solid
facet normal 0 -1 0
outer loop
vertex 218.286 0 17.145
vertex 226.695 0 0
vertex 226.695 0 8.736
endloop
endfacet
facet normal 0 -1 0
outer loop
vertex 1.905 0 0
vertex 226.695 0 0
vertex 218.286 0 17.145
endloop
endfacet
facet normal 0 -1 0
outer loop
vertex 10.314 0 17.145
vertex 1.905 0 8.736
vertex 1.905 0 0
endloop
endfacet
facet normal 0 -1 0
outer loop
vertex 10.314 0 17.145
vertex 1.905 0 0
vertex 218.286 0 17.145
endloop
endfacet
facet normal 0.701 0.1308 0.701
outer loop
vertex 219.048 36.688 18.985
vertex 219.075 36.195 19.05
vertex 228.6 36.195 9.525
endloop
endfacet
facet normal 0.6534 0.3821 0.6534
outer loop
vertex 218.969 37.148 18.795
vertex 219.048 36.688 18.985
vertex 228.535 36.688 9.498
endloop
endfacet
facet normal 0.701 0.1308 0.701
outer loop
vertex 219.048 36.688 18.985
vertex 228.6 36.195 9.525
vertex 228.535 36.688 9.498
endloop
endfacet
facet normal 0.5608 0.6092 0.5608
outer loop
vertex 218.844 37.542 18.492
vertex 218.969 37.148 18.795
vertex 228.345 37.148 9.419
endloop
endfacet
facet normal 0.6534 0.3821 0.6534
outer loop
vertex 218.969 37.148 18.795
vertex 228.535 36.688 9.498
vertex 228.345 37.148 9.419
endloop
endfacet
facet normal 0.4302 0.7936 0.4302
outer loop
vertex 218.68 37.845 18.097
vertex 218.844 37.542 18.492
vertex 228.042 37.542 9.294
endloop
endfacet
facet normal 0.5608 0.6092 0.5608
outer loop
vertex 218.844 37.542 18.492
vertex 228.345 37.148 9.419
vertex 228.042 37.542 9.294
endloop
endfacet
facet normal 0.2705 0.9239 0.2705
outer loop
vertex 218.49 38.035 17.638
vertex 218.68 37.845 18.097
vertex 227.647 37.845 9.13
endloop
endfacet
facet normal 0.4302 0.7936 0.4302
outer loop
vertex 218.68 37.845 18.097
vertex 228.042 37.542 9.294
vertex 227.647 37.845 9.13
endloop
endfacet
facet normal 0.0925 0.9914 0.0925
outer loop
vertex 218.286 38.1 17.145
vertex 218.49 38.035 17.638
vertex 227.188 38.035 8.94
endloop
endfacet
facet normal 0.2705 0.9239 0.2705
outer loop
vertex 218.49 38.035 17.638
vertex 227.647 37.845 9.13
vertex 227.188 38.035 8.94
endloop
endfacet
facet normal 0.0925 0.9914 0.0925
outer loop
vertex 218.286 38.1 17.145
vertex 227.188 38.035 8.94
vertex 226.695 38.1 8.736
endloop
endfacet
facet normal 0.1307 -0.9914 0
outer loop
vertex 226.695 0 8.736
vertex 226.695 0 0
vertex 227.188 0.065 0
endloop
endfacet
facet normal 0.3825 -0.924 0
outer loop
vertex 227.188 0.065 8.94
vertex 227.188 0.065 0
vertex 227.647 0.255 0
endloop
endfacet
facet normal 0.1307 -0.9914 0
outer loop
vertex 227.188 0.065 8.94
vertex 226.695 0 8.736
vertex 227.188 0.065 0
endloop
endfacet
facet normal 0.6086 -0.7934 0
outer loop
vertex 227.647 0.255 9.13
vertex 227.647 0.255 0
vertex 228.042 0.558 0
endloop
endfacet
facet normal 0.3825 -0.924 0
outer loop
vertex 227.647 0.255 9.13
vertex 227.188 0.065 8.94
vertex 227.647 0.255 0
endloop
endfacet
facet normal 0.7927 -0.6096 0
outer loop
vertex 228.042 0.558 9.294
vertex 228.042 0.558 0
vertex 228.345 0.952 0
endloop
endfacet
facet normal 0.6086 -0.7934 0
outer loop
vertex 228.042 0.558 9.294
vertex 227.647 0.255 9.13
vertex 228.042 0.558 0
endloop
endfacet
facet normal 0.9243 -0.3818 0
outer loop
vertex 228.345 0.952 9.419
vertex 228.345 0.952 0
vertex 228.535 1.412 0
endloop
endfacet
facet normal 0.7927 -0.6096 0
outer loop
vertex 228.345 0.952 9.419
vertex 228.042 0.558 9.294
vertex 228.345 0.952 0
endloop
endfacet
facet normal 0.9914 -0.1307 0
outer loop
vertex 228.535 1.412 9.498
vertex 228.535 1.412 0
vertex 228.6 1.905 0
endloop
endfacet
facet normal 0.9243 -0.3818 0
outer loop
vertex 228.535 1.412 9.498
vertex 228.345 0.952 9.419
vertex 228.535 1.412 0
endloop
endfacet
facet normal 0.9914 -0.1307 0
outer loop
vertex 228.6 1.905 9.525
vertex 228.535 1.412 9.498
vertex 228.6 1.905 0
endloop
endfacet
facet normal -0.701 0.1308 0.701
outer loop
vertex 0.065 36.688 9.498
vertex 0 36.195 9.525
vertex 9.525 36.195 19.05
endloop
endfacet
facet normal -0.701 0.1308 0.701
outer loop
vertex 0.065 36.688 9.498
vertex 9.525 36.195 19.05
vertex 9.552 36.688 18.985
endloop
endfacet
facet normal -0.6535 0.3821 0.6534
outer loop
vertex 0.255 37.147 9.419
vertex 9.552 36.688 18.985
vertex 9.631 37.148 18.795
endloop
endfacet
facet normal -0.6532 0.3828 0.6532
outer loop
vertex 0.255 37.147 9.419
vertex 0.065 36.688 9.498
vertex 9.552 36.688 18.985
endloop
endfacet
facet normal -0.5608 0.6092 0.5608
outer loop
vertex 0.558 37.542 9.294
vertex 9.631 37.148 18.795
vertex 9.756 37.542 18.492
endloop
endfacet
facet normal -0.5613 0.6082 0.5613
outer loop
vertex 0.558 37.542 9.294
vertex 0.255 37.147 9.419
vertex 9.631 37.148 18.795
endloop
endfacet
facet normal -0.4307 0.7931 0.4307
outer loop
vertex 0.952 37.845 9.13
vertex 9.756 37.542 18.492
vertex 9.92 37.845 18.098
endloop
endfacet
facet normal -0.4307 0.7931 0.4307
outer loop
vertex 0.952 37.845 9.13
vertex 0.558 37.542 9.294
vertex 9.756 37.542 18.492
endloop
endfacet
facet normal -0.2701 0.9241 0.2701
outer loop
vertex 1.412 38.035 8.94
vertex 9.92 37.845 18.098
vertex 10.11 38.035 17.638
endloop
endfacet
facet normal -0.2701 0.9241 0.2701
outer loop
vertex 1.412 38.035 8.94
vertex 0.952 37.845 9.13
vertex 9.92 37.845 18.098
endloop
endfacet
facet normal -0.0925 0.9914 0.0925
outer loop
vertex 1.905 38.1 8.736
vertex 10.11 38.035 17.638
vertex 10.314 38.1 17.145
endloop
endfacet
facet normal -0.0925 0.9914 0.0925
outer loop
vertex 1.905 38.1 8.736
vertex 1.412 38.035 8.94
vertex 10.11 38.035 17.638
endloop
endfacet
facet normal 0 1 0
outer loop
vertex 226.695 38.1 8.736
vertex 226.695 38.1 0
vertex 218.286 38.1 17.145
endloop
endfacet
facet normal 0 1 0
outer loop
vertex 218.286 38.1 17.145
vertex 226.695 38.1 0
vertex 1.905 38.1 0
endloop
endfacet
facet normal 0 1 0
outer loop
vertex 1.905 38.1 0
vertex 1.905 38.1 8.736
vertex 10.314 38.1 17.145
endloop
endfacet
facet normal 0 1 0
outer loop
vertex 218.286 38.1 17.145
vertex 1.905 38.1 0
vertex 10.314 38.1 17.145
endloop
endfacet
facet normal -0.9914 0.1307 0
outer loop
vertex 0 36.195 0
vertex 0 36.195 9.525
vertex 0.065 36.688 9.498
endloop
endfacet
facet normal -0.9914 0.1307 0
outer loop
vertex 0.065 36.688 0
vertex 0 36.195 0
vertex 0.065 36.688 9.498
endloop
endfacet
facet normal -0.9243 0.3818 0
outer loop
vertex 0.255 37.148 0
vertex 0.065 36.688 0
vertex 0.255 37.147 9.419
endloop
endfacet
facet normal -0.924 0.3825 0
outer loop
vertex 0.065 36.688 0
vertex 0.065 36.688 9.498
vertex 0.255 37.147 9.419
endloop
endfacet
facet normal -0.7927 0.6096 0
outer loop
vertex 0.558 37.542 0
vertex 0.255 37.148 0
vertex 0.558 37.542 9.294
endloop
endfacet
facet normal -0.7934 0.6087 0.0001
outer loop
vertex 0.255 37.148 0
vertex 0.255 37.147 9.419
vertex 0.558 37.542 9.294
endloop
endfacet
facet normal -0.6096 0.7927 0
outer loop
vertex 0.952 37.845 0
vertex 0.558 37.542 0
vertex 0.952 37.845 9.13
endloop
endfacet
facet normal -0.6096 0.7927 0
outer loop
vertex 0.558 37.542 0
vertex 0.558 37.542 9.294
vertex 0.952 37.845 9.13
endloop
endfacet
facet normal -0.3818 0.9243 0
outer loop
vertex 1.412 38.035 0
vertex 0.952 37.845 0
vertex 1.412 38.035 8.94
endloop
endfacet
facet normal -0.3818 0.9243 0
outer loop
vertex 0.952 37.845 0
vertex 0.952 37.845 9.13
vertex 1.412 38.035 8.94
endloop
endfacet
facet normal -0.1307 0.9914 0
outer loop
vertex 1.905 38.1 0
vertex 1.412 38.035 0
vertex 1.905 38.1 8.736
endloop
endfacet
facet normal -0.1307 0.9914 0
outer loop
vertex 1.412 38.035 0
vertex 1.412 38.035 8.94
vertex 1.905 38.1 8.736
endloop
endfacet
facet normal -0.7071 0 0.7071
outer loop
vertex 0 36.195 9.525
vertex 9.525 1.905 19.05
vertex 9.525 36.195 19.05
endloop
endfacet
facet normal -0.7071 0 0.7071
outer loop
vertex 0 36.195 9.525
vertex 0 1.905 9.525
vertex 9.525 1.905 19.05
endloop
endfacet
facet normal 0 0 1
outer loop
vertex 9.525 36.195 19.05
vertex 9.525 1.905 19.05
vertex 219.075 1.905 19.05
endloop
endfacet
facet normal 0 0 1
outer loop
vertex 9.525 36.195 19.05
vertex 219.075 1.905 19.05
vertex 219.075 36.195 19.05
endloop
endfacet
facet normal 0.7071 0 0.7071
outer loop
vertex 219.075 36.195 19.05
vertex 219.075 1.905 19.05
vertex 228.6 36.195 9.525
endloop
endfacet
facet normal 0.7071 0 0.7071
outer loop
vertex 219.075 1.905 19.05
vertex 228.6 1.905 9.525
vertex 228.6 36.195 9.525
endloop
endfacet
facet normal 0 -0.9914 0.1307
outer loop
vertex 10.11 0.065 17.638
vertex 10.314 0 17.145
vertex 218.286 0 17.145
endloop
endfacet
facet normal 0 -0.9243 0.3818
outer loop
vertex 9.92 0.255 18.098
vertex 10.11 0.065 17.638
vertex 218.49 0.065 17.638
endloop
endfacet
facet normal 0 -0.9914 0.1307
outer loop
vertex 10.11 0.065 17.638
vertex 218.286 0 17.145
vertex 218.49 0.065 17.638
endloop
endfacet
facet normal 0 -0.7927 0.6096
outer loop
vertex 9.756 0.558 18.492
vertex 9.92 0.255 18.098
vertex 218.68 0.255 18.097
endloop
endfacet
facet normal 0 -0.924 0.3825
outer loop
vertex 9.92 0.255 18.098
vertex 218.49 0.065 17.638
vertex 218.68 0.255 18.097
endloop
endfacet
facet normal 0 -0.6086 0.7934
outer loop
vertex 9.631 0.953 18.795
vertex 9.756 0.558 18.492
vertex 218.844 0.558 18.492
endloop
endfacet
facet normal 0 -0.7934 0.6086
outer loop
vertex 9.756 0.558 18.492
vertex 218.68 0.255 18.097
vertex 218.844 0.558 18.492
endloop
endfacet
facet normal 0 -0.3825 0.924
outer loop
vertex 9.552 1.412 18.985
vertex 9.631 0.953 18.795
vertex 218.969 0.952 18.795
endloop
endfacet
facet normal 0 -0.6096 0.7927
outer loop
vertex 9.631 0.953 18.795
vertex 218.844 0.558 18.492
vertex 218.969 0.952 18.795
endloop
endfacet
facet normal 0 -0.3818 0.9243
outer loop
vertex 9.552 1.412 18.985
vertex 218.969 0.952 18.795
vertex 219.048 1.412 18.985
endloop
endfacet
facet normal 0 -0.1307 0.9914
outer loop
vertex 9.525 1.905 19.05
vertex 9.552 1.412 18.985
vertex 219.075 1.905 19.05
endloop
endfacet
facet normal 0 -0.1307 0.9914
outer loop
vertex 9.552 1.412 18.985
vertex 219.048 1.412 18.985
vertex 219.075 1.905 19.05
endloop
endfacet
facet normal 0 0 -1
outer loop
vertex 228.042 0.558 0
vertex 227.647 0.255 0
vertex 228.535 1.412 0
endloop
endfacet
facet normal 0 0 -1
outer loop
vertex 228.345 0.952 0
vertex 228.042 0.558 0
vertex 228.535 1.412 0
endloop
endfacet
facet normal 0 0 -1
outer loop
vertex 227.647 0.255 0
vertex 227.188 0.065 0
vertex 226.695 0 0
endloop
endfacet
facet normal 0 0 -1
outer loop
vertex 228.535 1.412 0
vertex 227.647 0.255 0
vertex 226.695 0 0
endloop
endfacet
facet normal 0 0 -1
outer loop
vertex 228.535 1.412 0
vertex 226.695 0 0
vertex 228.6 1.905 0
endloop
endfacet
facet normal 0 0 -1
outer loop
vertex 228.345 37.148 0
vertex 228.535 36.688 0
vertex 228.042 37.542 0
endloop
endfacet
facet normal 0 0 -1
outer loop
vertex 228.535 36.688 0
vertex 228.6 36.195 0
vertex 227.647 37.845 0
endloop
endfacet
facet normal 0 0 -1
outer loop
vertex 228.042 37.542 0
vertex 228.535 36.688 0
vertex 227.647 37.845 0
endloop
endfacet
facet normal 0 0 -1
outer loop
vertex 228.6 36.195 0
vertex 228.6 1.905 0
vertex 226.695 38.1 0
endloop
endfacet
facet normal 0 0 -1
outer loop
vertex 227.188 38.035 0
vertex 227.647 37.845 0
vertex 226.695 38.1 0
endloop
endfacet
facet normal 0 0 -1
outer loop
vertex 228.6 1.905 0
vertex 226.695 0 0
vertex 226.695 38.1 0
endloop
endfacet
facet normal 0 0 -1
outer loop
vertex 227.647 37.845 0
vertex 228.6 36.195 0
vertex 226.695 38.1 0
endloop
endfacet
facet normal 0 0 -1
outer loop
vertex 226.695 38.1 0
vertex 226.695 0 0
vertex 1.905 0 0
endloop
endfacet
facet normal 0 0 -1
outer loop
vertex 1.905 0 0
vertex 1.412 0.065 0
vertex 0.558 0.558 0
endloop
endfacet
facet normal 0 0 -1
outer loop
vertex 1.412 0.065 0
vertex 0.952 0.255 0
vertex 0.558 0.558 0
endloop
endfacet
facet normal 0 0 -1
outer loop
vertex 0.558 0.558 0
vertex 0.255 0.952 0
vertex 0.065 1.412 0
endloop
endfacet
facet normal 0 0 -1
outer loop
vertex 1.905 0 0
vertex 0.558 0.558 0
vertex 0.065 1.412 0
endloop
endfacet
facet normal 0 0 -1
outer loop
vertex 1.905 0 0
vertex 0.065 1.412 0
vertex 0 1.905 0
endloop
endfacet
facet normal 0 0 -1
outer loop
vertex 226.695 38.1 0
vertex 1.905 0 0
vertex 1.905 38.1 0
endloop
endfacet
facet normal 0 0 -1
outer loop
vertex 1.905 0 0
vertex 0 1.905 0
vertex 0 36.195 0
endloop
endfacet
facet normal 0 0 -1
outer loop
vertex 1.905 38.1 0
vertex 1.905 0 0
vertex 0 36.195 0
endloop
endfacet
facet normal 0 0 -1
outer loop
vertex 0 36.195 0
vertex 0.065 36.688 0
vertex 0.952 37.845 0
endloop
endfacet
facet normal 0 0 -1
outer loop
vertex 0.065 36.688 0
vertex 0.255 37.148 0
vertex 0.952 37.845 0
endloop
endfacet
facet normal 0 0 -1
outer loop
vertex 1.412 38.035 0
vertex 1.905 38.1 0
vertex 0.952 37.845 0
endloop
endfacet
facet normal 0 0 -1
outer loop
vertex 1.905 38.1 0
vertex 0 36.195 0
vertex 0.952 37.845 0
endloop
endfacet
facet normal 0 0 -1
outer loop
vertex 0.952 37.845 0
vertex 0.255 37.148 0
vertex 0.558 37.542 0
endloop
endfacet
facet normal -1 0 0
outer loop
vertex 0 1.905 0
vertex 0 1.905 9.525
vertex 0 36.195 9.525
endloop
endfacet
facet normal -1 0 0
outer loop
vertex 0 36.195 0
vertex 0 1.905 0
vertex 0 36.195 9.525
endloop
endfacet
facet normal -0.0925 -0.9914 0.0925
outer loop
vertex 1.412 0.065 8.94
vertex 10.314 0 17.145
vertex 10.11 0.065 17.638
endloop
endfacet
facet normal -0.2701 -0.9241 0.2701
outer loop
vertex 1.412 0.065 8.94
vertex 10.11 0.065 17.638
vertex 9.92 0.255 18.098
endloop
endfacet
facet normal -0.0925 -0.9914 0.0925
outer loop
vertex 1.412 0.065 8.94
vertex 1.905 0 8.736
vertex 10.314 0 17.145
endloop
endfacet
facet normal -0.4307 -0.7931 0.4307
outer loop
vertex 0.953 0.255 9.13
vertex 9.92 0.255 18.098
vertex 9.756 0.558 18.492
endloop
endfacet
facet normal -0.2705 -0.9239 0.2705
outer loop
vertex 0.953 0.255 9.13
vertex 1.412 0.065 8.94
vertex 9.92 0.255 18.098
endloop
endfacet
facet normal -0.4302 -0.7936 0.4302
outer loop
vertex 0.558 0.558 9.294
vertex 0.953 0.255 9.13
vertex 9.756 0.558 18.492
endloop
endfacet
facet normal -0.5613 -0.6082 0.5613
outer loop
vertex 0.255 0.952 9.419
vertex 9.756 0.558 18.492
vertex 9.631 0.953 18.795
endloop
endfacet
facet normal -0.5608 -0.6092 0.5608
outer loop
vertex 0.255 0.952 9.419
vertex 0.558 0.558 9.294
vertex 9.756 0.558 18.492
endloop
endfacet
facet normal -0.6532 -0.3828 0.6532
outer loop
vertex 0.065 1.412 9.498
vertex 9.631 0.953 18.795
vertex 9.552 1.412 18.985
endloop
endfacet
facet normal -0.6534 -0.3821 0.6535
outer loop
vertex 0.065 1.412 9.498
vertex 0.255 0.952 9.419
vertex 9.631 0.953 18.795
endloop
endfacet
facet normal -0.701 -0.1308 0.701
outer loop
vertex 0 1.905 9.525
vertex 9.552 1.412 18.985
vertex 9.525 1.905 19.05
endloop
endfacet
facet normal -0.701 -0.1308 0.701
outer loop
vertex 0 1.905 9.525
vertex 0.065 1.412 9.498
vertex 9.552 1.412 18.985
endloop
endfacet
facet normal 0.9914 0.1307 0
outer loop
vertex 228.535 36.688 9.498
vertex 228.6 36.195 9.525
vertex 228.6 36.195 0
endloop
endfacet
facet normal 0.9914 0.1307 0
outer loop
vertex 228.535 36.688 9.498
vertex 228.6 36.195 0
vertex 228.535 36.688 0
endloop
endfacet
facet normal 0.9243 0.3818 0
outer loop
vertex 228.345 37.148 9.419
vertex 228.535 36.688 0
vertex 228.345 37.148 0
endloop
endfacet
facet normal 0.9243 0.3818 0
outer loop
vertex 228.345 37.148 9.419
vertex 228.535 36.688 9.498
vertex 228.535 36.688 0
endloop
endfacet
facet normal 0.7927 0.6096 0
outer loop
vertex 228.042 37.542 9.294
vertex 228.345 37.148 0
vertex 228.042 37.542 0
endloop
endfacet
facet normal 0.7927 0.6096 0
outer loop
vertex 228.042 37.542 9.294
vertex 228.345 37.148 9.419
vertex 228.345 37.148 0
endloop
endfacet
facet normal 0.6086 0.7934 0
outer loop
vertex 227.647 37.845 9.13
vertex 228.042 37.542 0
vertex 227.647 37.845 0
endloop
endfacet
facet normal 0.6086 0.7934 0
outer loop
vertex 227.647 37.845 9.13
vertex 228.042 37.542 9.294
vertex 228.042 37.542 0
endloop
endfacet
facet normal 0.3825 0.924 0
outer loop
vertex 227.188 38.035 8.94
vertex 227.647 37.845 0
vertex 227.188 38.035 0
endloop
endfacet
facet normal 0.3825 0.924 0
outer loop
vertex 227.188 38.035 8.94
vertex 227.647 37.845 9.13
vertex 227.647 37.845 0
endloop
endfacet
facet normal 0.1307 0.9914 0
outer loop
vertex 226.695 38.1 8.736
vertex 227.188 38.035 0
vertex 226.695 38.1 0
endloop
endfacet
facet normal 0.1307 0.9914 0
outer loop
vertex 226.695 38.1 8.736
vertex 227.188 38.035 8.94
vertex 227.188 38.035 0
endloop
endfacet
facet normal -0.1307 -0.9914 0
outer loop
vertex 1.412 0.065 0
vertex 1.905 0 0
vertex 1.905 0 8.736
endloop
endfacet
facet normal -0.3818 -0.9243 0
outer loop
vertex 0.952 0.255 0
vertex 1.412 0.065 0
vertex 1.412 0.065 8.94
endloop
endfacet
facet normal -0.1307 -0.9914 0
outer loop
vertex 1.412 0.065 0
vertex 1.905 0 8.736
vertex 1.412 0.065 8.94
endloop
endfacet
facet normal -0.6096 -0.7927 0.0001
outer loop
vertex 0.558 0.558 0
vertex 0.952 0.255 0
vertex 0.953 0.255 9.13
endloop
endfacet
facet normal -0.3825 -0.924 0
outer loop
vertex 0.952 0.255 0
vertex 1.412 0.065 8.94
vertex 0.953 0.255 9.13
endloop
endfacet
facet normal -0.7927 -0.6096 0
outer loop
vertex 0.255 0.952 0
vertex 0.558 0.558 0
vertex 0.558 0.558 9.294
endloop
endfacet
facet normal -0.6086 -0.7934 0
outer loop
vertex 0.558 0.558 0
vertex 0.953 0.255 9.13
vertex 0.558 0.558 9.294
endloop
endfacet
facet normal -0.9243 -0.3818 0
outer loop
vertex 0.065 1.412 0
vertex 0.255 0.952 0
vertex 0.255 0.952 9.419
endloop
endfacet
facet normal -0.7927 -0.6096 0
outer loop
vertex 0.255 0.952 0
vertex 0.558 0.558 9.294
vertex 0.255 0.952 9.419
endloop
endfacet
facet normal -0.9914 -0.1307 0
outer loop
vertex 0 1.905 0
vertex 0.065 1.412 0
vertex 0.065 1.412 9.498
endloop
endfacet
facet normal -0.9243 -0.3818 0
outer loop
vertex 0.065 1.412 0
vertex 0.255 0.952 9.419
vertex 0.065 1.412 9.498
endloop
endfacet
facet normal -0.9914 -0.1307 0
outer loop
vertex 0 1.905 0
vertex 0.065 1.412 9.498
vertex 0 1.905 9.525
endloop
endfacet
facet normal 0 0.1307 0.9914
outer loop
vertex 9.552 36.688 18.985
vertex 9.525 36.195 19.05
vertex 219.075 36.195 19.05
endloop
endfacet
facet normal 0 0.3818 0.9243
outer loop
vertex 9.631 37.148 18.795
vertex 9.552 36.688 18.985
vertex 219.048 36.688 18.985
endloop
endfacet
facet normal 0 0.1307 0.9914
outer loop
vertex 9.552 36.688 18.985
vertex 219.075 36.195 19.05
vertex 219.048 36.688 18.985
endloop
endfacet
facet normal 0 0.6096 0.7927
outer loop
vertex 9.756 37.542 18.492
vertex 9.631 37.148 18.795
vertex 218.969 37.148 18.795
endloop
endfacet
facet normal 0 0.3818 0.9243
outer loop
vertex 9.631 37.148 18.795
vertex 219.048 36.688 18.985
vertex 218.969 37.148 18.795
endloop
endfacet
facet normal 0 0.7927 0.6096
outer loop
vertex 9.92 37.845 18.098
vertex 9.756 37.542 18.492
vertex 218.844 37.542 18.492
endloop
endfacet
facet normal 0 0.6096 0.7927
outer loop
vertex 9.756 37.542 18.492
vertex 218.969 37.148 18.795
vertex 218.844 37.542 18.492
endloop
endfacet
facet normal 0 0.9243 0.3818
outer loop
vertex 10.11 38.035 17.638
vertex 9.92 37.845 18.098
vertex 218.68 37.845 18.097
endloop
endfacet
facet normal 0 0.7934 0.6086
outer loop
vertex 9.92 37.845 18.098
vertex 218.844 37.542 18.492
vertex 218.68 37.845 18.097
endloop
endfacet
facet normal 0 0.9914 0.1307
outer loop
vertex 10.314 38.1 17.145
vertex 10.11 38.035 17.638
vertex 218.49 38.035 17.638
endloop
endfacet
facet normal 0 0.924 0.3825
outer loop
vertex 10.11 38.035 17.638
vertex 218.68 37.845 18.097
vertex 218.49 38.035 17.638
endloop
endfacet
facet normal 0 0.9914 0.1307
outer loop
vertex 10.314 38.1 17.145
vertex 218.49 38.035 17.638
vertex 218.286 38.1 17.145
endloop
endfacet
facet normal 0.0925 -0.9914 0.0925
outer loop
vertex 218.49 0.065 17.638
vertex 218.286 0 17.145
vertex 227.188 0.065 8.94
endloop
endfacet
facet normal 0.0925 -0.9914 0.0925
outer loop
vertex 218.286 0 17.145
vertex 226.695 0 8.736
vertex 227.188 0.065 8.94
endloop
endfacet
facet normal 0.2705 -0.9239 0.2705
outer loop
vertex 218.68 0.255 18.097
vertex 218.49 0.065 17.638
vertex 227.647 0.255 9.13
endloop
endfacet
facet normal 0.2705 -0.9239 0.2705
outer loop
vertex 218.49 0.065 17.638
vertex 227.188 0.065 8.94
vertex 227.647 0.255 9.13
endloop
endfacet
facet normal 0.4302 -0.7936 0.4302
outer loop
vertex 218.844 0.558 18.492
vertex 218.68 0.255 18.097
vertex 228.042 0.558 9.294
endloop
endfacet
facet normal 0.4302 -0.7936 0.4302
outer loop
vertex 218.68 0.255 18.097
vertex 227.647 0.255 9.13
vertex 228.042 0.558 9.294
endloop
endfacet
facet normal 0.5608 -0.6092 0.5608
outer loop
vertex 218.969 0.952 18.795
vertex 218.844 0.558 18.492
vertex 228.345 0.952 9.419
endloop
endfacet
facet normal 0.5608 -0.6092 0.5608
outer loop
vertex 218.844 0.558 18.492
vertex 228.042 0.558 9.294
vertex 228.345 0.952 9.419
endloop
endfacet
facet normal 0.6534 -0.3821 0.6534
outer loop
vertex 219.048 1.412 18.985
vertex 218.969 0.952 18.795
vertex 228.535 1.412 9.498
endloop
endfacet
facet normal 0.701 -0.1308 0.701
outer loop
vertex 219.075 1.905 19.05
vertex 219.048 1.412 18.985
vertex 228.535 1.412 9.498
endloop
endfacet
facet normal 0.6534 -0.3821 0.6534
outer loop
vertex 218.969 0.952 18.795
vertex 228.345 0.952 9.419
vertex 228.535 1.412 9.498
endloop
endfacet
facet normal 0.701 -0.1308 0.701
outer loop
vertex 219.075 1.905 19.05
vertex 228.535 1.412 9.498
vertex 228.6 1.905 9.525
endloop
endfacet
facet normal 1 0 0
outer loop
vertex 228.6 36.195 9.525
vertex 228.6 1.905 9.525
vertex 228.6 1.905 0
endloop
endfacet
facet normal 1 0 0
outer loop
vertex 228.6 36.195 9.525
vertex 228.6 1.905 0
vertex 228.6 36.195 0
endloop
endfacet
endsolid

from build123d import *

# Parameters (mm, degrees)
F0_W     = 38.1
F0_H     = 19.05
F1_DEPTH = 228.6
F2_SIZE  = 9.525
F3_R     = 1.905


with BuildPart() as f1:
    # F0 (on Right) → F1 (new body)
    with BuildSketch(Plane.YZ):
        with Locations((19.05, 9.525)):
            Rectangle(F0_W, F0_H)
    extrude(amount=F1_DEPTH)

    # F2
    f2_edges = [f1.edges().sort_by_distance(p)[0] for p in [
        (0, 19.05, 19.05),
        (228.6, 19.05, 19.05),
    ]]
    chamfer(f2_edges, length=F2_SIZE)

    # F3
    f3_edges = [f1.edges().sort_by_distance(p)[0] for p in [
        (114.3, 0, 19.05),
        (4.7625, 0, 14.2875),
        (0, 0, 4.7625),
        (223.8375, 0, 14.2875),
        (228.6, 0, 4.7625),
        (114.3, 38.1, 19.05),
        (4.7625, 38.1, 14.2875),
        (0, 38.1, 4.7625),
        (223.8375, 38.1, 14.2875),
        (228.6, 38.1, 4.7625),
    ]]
    fillet(f3_edges, radius=F3_R)


solid = f1.part
